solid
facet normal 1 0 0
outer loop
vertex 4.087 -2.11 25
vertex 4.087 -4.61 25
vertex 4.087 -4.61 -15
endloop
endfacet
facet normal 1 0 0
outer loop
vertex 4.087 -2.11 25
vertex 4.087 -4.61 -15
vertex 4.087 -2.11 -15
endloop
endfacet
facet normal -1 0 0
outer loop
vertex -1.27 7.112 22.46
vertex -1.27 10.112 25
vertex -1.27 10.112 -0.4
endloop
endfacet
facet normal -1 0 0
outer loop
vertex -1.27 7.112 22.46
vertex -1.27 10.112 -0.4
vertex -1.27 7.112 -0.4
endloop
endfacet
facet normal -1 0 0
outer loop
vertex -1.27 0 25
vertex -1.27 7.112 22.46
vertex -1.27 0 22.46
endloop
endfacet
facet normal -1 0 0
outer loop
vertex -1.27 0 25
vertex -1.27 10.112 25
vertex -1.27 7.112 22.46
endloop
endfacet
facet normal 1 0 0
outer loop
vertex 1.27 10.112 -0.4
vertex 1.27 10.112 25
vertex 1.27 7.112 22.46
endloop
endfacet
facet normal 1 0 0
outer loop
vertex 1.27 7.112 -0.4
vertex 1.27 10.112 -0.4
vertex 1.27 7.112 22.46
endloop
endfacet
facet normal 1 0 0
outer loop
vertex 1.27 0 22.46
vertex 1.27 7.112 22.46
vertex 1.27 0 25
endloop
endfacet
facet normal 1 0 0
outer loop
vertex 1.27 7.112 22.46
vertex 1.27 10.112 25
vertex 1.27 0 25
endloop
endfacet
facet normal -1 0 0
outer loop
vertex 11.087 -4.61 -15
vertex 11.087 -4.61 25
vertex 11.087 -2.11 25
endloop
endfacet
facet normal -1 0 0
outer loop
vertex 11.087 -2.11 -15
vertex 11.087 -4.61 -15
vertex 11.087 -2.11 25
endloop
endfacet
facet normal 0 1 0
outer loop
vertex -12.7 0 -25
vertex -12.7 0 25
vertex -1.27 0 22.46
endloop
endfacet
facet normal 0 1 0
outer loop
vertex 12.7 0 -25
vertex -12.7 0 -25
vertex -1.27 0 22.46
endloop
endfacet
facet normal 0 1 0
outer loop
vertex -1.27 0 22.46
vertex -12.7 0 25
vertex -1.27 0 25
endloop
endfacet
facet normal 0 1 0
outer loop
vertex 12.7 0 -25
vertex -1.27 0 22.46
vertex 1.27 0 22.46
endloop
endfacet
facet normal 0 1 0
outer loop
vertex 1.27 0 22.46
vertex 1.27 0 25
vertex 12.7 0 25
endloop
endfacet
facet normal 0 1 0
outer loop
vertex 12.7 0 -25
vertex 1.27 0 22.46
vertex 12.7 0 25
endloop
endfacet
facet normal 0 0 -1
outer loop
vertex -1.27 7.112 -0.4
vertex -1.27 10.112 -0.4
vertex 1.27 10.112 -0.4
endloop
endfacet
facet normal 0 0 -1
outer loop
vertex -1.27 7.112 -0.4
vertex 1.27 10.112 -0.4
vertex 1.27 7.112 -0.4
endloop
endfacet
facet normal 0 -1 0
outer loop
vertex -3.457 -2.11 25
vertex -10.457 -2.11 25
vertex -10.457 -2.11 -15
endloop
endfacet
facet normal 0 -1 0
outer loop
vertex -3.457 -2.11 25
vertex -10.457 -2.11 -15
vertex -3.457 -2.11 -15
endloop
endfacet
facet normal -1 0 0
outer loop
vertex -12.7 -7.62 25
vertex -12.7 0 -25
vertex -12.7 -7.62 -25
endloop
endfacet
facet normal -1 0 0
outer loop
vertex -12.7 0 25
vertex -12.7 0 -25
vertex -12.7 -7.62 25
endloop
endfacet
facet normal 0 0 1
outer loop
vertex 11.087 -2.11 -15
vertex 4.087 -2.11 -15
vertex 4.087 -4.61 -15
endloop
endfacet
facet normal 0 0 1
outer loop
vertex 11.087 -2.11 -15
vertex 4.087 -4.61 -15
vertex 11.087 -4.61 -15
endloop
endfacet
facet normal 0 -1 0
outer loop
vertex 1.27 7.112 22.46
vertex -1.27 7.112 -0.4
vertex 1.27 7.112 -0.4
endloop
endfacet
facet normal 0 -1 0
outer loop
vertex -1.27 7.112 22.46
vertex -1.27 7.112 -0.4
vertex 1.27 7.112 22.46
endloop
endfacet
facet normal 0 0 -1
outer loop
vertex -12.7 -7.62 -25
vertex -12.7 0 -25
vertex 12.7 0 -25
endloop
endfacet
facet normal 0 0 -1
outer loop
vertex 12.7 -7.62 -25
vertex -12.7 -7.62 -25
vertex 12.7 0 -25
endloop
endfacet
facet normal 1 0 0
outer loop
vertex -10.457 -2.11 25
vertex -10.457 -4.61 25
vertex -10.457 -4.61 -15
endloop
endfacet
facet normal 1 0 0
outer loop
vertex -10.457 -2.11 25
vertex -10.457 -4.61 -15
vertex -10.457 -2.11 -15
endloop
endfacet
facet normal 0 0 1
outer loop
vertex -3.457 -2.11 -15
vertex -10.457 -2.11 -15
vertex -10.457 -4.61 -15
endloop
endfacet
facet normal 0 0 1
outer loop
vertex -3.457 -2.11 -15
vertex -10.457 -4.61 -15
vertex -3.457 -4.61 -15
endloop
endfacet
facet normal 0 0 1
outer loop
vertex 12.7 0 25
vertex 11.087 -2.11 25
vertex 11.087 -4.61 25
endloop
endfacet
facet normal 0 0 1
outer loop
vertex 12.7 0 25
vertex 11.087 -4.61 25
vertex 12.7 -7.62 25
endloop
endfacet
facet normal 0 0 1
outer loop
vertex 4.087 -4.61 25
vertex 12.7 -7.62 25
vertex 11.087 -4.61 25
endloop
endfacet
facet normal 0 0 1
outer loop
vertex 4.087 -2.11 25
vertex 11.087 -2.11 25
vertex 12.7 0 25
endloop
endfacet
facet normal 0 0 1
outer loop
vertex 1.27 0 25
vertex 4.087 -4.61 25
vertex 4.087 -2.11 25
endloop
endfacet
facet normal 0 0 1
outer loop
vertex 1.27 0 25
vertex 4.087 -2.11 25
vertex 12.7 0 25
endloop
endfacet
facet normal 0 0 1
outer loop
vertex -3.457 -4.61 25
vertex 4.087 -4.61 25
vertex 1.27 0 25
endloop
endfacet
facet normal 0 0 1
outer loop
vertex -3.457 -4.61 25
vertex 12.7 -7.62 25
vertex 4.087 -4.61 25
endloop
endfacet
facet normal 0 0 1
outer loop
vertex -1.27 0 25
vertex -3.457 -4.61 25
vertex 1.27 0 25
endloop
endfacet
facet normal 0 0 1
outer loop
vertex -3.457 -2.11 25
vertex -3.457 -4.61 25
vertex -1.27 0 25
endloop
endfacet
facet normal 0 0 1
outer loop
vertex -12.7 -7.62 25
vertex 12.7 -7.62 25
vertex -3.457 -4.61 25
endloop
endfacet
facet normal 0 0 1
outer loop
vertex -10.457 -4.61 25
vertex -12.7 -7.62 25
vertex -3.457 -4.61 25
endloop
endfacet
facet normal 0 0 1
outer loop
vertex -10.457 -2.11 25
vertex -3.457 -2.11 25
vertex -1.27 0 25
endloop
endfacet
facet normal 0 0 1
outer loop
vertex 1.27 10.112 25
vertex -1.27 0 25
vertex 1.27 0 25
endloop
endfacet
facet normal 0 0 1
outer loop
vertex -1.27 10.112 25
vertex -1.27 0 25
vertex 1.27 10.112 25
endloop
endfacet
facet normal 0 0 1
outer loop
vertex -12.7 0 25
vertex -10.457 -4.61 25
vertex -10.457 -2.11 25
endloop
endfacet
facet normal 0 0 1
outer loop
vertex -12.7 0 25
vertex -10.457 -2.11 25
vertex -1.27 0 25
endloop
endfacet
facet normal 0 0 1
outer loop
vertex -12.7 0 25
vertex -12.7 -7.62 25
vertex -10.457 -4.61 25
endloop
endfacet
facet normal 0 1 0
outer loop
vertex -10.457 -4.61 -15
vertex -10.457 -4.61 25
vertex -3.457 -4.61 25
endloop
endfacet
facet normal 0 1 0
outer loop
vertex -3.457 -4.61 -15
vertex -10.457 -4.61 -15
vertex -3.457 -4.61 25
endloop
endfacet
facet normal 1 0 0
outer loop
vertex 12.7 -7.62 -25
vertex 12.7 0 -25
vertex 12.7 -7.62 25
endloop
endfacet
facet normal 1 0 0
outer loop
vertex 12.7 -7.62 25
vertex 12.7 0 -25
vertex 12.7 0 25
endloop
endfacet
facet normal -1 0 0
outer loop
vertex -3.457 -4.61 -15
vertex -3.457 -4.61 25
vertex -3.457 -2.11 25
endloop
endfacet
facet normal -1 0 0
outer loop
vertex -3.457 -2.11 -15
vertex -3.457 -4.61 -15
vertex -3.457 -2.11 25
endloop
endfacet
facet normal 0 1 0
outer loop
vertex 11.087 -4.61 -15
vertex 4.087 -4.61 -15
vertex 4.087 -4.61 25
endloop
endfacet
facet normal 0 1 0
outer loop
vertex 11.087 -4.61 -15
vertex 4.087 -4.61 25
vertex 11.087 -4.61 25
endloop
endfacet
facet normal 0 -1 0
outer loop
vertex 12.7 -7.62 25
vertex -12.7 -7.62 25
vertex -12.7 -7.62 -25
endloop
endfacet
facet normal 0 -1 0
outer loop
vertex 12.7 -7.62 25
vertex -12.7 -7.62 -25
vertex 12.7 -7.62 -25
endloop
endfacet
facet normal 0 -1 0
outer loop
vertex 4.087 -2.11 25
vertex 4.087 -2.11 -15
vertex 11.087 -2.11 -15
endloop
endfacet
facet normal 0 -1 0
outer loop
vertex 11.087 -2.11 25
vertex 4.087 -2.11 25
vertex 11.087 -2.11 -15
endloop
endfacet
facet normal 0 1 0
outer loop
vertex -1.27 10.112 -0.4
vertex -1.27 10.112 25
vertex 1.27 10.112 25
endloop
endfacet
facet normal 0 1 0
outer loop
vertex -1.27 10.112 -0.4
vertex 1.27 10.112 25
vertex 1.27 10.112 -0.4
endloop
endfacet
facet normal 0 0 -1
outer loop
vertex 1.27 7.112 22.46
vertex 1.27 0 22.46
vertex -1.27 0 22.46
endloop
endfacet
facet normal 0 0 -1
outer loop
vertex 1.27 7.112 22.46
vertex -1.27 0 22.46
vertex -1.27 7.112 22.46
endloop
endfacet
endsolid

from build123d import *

# Parameters (mm, degrees)
F0_W      = 25.4
F0_H      = 50
F1_DEPTH  = 7.62
F2_W      = 7.112
F2_H      = 2.54
F3_DEPTH  = 1.27
F3_FACE_W = 7.112
F3_FACE_H = 2.54
F4_DEPTH  = 1.27
F6_DEPTH  = 2.54
F7_W      = 7
F7_H      = 2.5
F8_DEPTH  = 40


with BuildPart() as f1:
    # F0 (on Front) → F1 (new body)
    with BuildSketch(Plane.XZ):
        Rectangle(F0_W, F0_H)
    extrude(amount=F1_DEPTH)

    # F2 (on Right) → F3 (join)
    with BuildSketch(Plane.YZ):
        with Locations((3.556, 23.73)):
            Rectangle(F2_W, F2_H)
    extrude(amount=F3_DEPTH)

    # F3_face (on face) → F4 (join)
    with BuildSketch(Plane(origin=(0, 3.556, 23.73), x_dir=(0, 1, 0), z_dir=(-1, 0, 0))):
        Rectangle(F3_FACE_W, F3_FACE_H)
    extrude(amount=F4_DEPTH)

    # F5 (on face) → F6 (join)
    with BuildSketch(Plane(origin=(-1.27, 0, 0), x_dir=(0, -1, 0), z_dir=(-1, 0, 0))):
        Polygon((-7.112, 22.46), (-7.112, 25), (-10.112, 25), (-10.112, -0.4), (-7.112, -0.4), align=None)
    extrude(amount=-F6_DEPTH)

    # F7 (on face) → F8 (cut)
    with BuildSketch(Plane.XY.offset(25)):
        with Locations((-6.956602, -3.36)):
            Rectangle(F7_W, F7_H)
        with Locations((7.587198, -3.36)):
            Rectangle(F7_W, F7_H)
    extrude(amount=-F8_DEPTH, mode=Mode.SUBTRACT)


solid = f1.part
